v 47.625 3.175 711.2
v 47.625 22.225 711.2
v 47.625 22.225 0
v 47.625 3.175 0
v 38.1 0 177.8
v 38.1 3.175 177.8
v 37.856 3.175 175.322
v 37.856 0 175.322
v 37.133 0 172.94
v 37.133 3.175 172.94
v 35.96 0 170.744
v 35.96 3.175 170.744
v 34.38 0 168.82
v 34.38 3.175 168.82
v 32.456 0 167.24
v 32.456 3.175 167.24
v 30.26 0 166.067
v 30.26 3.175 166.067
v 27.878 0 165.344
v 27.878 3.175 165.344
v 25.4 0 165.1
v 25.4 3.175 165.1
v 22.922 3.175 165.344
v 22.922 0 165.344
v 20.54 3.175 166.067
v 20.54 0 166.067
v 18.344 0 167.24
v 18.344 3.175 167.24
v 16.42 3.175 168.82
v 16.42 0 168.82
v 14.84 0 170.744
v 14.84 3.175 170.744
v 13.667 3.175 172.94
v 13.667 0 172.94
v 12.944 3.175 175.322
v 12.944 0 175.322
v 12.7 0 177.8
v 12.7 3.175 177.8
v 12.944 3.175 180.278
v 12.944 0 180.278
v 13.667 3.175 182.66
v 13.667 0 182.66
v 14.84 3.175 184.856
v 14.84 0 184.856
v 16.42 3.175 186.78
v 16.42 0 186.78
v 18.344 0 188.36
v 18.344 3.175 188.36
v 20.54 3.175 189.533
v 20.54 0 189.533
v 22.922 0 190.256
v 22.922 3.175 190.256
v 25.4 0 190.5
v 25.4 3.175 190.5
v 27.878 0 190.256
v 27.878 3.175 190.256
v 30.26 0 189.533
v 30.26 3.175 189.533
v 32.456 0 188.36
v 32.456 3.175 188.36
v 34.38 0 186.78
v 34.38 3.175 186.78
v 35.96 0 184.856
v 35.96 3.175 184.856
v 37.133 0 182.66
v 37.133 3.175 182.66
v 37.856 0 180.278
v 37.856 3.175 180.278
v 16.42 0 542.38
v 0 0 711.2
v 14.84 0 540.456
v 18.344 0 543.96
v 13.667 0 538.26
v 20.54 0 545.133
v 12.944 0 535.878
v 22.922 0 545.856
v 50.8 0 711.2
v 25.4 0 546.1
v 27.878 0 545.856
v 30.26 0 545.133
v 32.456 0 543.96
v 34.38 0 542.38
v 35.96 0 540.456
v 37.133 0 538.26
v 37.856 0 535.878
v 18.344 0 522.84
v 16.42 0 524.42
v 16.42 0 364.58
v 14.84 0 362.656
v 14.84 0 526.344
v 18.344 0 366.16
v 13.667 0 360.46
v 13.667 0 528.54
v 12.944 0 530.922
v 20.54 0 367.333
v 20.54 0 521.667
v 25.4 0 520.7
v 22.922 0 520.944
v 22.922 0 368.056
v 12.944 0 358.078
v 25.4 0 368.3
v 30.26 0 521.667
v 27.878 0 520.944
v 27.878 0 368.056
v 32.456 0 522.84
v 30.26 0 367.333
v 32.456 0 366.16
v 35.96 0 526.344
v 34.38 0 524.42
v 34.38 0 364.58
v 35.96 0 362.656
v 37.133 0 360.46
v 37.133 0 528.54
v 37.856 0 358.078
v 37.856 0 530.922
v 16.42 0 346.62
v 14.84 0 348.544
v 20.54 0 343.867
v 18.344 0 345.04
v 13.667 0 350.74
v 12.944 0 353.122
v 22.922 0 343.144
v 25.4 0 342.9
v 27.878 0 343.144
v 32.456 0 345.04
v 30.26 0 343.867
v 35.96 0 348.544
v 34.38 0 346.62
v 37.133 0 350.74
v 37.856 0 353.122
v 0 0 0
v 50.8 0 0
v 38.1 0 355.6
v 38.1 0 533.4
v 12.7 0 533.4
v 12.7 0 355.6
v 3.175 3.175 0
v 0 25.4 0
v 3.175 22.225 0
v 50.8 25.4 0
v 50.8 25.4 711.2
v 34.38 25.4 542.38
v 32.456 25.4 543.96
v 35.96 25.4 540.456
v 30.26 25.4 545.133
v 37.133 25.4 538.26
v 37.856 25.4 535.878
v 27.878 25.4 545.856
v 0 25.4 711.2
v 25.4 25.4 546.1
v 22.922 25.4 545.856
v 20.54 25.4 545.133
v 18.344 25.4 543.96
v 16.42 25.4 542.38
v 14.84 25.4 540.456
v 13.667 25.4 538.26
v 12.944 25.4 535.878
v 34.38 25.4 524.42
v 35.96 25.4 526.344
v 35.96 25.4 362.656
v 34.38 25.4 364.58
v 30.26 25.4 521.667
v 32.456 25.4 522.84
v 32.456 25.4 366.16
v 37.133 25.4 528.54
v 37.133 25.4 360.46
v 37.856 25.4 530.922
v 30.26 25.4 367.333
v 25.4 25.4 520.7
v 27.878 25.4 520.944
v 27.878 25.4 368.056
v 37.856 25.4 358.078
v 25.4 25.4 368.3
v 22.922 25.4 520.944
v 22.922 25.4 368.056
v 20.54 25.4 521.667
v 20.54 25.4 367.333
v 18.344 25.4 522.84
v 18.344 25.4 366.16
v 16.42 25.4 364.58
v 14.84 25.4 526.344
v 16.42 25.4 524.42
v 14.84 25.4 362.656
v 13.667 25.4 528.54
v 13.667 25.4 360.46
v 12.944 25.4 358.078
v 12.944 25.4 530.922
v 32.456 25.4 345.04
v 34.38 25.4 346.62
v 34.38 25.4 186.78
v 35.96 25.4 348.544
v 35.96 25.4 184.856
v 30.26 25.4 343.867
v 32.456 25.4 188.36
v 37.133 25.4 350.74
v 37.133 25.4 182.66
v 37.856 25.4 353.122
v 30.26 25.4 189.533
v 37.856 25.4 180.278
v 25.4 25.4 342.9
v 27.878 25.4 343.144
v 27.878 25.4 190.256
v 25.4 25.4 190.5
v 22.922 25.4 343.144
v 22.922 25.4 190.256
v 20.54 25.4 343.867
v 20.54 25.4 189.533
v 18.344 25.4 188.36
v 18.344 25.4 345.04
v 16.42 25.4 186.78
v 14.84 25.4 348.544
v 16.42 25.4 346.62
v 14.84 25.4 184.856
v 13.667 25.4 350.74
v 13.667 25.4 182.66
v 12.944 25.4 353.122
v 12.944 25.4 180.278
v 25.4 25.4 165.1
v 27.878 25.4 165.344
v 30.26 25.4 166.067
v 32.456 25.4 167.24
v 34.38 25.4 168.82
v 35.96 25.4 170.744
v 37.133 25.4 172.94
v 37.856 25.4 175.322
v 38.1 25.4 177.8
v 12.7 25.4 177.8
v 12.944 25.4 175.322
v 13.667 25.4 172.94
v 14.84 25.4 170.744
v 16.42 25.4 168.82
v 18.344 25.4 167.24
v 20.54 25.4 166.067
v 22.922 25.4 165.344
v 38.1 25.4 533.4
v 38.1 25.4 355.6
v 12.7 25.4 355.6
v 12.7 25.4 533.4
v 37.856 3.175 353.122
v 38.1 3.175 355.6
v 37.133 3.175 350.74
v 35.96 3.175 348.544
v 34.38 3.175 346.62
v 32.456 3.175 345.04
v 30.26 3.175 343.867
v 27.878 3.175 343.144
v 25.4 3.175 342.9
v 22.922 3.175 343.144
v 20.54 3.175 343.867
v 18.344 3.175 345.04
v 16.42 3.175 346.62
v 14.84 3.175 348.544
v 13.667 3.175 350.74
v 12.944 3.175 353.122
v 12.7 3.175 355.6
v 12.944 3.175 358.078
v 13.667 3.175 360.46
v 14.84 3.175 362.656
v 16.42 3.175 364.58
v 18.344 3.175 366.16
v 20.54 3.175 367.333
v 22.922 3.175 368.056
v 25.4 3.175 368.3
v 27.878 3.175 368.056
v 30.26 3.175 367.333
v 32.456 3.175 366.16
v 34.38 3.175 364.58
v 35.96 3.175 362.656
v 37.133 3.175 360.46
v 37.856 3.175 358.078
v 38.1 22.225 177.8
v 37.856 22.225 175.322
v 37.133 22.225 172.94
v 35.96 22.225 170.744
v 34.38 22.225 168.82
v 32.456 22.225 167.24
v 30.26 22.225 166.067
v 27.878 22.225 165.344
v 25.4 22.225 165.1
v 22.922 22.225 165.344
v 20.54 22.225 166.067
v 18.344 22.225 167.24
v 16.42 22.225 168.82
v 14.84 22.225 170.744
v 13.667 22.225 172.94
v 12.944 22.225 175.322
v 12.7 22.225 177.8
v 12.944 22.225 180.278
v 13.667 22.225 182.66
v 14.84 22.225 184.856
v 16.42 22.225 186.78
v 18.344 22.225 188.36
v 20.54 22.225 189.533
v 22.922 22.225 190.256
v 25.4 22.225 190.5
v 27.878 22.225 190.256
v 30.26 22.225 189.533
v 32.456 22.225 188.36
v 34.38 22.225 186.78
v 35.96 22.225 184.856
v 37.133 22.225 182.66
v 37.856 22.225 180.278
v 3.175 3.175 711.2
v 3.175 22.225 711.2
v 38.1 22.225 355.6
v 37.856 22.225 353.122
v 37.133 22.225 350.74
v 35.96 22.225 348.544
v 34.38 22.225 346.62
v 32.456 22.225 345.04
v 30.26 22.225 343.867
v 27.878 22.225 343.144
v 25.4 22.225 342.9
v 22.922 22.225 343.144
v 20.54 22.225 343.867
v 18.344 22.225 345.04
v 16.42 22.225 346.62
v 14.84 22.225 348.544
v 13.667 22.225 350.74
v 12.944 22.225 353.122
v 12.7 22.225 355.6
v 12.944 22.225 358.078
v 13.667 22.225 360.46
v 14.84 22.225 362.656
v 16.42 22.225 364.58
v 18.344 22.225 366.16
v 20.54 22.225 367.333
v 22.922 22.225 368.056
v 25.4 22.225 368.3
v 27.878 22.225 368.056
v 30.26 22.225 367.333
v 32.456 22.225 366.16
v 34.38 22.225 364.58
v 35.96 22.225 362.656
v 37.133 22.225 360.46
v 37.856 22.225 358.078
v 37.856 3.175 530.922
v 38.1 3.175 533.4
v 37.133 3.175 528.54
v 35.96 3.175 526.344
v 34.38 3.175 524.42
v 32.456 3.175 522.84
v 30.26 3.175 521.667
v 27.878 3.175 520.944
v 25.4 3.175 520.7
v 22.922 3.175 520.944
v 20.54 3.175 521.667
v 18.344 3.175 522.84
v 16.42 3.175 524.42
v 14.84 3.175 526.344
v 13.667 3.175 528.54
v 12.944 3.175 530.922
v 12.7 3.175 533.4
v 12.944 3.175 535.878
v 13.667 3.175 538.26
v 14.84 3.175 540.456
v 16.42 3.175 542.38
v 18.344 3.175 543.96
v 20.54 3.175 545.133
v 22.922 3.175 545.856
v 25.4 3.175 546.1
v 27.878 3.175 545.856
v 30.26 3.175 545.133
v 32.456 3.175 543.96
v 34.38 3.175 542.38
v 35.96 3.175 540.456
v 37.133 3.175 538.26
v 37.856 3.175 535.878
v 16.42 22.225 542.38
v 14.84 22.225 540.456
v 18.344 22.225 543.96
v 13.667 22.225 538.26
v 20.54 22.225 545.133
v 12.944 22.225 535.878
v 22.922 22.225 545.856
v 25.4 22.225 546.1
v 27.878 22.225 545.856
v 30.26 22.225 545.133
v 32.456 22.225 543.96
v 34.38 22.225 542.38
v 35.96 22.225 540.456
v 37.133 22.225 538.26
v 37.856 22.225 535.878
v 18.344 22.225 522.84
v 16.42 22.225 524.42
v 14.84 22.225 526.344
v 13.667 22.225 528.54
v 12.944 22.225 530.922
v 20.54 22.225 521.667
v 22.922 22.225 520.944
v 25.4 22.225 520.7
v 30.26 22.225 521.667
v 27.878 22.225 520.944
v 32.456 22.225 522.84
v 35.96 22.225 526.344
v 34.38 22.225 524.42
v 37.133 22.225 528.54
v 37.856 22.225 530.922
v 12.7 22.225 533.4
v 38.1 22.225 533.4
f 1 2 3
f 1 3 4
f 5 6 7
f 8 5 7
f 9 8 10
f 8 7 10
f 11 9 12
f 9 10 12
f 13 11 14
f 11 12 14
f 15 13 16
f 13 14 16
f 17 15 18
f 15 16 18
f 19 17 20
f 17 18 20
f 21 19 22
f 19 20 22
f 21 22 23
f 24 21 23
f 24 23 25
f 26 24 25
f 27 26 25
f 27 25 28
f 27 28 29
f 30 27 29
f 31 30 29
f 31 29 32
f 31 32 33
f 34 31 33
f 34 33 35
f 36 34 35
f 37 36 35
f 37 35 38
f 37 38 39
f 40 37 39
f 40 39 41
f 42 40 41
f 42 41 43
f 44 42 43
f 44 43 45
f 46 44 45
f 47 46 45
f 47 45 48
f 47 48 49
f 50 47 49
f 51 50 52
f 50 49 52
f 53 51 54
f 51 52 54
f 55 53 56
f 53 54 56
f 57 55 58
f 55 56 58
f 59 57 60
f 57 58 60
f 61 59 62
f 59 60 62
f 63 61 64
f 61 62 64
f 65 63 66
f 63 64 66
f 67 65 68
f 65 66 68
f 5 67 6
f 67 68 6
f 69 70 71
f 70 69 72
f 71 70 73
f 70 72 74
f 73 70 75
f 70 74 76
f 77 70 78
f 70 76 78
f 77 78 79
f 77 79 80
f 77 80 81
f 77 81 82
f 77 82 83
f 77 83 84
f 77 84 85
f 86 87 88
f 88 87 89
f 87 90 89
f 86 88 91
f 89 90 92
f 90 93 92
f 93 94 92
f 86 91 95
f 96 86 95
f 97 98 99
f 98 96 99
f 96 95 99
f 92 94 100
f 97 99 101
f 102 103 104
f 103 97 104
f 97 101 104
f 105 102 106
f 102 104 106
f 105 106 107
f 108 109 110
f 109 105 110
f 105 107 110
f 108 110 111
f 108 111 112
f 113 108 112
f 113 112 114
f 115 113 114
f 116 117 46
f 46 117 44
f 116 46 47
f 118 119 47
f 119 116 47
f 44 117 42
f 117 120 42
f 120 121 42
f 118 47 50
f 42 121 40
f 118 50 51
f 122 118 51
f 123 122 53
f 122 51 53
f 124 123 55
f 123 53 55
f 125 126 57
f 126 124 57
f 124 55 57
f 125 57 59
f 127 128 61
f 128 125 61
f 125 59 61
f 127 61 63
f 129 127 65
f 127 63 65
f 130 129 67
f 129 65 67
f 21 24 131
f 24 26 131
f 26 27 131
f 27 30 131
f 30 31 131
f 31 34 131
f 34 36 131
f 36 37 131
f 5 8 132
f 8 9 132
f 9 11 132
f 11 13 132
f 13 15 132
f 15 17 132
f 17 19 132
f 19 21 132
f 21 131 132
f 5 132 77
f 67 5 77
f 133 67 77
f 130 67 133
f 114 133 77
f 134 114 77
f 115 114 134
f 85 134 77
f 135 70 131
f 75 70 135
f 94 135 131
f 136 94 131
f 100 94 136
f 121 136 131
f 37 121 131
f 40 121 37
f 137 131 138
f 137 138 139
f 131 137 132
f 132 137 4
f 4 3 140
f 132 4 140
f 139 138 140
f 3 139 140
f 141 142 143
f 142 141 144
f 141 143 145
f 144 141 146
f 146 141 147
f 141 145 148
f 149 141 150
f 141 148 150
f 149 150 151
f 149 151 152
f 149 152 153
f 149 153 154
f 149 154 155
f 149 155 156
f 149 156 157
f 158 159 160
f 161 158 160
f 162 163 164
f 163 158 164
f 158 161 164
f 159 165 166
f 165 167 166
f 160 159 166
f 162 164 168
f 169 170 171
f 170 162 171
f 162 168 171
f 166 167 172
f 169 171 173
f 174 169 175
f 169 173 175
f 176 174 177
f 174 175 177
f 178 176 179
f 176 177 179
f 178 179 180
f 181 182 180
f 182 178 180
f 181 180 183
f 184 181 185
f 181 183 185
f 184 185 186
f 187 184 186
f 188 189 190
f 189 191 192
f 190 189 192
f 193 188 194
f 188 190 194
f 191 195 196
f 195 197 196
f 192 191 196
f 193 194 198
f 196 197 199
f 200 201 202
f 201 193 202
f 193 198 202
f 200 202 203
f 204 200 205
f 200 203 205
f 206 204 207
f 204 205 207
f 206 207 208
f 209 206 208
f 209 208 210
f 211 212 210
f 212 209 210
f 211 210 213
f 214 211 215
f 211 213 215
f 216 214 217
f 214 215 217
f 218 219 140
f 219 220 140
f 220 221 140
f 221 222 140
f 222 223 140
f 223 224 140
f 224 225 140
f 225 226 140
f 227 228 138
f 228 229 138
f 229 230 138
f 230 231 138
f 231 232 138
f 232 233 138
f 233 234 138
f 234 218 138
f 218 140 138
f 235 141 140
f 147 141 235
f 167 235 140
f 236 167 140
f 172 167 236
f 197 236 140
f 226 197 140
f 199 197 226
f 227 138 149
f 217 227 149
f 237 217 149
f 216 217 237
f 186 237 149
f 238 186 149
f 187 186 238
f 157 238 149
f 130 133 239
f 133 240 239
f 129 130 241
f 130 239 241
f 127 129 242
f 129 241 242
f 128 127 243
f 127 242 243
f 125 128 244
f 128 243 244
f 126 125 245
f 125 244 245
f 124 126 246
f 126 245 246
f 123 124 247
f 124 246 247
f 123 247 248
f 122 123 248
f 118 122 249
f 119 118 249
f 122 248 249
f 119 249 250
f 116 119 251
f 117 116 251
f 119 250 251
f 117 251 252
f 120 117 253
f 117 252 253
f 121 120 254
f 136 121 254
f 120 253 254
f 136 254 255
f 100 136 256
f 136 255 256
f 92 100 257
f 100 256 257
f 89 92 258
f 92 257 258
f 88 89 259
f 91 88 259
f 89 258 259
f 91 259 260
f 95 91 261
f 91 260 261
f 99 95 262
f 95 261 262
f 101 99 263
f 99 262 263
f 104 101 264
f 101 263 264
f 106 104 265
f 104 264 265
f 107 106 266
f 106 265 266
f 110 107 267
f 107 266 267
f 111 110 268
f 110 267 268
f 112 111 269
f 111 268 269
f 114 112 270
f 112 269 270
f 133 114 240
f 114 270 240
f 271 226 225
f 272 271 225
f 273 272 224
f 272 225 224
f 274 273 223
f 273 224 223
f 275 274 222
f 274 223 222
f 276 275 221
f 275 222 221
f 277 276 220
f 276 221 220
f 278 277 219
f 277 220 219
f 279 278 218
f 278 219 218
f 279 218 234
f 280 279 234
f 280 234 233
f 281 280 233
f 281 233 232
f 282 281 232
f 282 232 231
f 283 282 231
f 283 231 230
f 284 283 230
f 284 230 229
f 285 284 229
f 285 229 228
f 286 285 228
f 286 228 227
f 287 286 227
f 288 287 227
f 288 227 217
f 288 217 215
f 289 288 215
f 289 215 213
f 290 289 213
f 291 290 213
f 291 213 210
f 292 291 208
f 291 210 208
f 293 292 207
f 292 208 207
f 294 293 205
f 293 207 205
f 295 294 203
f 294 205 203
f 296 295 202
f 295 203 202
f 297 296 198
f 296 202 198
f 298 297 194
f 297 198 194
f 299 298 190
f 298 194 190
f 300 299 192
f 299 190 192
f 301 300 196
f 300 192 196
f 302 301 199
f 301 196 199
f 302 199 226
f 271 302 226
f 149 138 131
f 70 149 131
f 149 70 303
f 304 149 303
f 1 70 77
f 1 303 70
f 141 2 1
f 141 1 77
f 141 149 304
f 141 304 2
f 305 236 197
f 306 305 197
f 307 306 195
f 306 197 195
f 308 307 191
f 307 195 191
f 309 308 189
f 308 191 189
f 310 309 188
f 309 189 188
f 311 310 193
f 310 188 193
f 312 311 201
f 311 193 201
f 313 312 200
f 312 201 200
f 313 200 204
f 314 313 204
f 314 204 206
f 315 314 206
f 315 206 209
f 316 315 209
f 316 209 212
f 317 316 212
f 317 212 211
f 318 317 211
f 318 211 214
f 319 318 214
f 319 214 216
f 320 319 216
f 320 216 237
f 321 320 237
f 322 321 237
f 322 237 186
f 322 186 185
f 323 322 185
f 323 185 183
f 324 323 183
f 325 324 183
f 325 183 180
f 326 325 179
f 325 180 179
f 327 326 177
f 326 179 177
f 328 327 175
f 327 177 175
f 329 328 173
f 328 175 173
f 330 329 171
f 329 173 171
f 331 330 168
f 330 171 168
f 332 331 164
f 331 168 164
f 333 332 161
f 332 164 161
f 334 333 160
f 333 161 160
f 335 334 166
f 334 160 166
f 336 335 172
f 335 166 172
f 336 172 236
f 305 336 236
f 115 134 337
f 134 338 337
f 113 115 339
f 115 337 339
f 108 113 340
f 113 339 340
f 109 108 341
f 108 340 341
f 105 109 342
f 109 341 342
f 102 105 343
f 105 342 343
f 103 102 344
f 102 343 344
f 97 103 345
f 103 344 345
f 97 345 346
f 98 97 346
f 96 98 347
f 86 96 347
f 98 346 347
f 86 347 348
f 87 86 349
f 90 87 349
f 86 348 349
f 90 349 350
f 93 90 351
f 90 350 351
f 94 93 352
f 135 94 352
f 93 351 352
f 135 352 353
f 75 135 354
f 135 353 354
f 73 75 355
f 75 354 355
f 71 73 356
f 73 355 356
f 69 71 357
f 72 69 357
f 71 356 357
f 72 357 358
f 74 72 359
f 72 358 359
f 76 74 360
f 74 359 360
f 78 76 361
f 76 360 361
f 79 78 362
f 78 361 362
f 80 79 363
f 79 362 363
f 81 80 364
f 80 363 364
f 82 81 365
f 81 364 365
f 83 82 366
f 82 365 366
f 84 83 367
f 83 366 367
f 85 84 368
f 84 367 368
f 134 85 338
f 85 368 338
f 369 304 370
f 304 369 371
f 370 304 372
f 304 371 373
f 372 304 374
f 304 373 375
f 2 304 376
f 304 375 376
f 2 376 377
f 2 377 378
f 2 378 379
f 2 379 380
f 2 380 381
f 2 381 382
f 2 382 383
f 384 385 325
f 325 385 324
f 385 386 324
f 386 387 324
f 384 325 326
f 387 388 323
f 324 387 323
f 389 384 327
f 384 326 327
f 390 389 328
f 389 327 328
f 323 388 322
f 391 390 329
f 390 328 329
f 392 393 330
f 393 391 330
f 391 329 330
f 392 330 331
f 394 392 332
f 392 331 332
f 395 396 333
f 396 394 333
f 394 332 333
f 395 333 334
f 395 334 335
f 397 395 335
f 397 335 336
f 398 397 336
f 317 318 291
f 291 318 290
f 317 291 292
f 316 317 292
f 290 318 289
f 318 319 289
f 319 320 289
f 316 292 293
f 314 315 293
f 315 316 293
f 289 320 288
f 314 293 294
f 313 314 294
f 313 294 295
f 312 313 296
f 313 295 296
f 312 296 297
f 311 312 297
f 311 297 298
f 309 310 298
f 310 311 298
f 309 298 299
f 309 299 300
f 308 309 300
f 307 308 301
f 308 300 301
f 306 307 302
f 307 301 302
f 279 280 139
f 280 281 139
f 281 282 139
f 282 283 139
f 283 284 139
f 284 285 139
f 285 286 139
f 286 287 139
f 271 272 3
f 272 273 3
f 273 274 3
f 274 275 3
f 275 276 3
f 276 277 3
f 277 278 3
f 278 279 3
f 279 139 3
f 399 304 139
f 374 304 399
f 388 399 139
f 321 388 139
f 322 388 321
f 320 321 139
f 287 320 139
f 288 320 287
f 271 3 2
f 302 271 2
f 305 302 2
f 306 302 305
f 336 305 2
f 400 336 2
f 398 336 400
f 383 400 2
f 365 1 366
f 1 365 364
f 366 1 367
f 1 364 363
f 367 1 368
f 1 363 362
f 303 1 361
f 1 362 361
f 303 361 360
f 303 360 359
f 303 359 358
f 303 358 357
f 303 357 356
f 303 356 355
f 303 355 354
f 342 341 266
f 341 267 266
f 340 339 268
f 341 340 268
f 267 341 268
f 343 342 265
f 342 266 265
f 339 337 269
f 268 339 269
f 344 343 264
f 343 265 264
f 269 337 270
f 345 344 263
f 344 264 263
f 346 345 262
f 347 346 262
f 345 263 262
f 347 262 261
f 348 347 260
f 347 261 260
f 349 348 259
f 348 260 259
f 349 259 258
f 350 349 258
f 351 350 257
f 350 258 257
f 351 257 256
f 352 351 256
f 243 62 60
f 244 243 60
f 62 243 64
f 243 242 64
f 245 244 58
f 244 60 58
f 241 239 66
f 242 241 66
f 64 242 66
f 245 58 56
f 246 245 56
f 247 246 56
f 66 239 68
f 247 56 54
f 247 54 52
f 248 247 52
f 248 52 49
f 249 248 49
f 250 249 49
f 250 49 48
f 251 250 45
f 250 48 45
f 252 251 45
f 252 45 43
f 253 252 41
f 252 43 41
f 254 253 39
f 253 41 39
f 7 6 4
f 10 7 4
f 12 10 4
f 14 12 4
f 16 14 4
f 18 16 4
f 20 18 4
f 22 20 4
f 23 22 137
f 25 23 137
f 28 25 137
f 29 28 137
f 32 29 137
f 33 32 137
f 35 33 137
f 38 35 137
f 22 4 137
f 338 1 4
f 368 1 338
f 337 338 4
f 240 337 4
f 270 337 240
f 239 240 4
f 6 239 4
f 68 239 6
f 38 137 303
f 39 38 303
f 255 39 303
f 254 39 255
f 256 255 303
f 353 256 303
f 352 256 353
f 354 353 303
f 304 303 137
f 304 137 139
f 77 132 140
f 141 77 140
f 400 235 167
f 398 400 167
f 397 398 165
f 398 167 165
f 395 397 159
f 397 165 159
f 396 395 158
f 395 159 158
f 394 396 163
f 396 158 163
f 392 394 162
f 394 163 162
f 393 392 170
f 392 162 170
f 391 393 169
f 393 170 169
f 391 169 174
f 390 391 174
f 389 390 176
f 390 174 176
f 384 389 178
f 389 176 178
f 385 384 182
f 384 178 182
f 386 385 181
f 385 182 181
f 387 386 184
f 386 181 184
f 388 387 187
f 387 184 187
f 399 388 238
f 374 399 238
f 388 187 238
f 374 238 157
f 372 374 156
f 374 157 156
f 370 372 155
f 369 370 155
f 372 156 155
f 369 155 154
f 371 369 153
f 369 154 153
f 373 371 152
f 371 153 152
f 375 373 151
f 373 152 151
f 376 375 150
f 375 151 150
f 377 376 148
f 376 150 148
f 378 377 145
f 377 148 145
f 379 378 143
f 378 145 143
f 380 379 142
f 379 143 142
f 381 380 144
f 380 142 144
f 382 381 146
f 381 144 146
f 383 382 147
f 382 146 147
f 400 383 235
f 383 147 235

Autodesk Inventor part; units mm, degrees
ref_plane "YZ Plane" through (0, 0, 0) normal (1, 0, 0) x (0, 1, 0)
ref_plane "XZ Plane" through (0, 0, 0) normal (0, 1, 0) x (-1, 0, 0)
ref_plane "XY Plane" through (0, 0, 0) normal (0, 0, 1) x (1, 0, 0)
sketch "Sketch1" plane through (0, 0, 0) normal (0, 0, 1) x (1, 0, 0)
  line L0 (0, 0) -> (50.8, 0)
  line L1 (50.8, 0) -> (50.8, 25.4)
  line L2 (50.8, 25.4) -> (0, 25.4)
  line L3 (0, 25.4) -> (0, 0)
  line L4 (3.175, 22.225) -> (47.625, 22.225)
  line L5 (47.625, 22.225) -> (47.625, 3.175)
  line L6 (47.625, 3.175) -> (3.175, 3.175)
  line L7 (3.175, 3.175) -> (3.175, 22.225)
  dimension "d0" = 50.8
  dimension "d1" = 25.4
  dimension "d2" = 3.175
extrude "Extrusion1" add sketch "Sketch1" along normal blind 711.2
sketch "Sketch2" plane through (0, 25.4, 0) normal (0, 1, 0) x (1, 0, 0)
  line L0 (0, 0) -> (0, -711.2) projected
  line L1 (0, -355.6) -> (50.8, -355.6)
  line L2 (50.8, 0) -> (50.8, -711.2) projected
  line L3 (50.8, -711.2) -> (0, -711.2) projected
  line L4 (0, -355.6) -> (0, -711.2)
  line L5 (0, -533.4) -> (50.8, -533.4)
  line L6 (0, -355.6) -> (0, 0)
  line L7 (0, -177.8) -> (50.8, -177.8)
  circle A0 centre (25.4, -533.4) radius 12.7
  circle A1 centre (25.4, -355.6) radius 12.7
  circle A2 centre (25.4, -177.8) radius 12.7
  dimension "d5" = 25.4
extrude "Extrusion2" cut sketch "Sketch2" against normal blind 25.4 contours A2 L7 | L7 A2 | A1 L1 | L1 A1 | A0 L5 | L5 A0
properties part number "1x2x28"
